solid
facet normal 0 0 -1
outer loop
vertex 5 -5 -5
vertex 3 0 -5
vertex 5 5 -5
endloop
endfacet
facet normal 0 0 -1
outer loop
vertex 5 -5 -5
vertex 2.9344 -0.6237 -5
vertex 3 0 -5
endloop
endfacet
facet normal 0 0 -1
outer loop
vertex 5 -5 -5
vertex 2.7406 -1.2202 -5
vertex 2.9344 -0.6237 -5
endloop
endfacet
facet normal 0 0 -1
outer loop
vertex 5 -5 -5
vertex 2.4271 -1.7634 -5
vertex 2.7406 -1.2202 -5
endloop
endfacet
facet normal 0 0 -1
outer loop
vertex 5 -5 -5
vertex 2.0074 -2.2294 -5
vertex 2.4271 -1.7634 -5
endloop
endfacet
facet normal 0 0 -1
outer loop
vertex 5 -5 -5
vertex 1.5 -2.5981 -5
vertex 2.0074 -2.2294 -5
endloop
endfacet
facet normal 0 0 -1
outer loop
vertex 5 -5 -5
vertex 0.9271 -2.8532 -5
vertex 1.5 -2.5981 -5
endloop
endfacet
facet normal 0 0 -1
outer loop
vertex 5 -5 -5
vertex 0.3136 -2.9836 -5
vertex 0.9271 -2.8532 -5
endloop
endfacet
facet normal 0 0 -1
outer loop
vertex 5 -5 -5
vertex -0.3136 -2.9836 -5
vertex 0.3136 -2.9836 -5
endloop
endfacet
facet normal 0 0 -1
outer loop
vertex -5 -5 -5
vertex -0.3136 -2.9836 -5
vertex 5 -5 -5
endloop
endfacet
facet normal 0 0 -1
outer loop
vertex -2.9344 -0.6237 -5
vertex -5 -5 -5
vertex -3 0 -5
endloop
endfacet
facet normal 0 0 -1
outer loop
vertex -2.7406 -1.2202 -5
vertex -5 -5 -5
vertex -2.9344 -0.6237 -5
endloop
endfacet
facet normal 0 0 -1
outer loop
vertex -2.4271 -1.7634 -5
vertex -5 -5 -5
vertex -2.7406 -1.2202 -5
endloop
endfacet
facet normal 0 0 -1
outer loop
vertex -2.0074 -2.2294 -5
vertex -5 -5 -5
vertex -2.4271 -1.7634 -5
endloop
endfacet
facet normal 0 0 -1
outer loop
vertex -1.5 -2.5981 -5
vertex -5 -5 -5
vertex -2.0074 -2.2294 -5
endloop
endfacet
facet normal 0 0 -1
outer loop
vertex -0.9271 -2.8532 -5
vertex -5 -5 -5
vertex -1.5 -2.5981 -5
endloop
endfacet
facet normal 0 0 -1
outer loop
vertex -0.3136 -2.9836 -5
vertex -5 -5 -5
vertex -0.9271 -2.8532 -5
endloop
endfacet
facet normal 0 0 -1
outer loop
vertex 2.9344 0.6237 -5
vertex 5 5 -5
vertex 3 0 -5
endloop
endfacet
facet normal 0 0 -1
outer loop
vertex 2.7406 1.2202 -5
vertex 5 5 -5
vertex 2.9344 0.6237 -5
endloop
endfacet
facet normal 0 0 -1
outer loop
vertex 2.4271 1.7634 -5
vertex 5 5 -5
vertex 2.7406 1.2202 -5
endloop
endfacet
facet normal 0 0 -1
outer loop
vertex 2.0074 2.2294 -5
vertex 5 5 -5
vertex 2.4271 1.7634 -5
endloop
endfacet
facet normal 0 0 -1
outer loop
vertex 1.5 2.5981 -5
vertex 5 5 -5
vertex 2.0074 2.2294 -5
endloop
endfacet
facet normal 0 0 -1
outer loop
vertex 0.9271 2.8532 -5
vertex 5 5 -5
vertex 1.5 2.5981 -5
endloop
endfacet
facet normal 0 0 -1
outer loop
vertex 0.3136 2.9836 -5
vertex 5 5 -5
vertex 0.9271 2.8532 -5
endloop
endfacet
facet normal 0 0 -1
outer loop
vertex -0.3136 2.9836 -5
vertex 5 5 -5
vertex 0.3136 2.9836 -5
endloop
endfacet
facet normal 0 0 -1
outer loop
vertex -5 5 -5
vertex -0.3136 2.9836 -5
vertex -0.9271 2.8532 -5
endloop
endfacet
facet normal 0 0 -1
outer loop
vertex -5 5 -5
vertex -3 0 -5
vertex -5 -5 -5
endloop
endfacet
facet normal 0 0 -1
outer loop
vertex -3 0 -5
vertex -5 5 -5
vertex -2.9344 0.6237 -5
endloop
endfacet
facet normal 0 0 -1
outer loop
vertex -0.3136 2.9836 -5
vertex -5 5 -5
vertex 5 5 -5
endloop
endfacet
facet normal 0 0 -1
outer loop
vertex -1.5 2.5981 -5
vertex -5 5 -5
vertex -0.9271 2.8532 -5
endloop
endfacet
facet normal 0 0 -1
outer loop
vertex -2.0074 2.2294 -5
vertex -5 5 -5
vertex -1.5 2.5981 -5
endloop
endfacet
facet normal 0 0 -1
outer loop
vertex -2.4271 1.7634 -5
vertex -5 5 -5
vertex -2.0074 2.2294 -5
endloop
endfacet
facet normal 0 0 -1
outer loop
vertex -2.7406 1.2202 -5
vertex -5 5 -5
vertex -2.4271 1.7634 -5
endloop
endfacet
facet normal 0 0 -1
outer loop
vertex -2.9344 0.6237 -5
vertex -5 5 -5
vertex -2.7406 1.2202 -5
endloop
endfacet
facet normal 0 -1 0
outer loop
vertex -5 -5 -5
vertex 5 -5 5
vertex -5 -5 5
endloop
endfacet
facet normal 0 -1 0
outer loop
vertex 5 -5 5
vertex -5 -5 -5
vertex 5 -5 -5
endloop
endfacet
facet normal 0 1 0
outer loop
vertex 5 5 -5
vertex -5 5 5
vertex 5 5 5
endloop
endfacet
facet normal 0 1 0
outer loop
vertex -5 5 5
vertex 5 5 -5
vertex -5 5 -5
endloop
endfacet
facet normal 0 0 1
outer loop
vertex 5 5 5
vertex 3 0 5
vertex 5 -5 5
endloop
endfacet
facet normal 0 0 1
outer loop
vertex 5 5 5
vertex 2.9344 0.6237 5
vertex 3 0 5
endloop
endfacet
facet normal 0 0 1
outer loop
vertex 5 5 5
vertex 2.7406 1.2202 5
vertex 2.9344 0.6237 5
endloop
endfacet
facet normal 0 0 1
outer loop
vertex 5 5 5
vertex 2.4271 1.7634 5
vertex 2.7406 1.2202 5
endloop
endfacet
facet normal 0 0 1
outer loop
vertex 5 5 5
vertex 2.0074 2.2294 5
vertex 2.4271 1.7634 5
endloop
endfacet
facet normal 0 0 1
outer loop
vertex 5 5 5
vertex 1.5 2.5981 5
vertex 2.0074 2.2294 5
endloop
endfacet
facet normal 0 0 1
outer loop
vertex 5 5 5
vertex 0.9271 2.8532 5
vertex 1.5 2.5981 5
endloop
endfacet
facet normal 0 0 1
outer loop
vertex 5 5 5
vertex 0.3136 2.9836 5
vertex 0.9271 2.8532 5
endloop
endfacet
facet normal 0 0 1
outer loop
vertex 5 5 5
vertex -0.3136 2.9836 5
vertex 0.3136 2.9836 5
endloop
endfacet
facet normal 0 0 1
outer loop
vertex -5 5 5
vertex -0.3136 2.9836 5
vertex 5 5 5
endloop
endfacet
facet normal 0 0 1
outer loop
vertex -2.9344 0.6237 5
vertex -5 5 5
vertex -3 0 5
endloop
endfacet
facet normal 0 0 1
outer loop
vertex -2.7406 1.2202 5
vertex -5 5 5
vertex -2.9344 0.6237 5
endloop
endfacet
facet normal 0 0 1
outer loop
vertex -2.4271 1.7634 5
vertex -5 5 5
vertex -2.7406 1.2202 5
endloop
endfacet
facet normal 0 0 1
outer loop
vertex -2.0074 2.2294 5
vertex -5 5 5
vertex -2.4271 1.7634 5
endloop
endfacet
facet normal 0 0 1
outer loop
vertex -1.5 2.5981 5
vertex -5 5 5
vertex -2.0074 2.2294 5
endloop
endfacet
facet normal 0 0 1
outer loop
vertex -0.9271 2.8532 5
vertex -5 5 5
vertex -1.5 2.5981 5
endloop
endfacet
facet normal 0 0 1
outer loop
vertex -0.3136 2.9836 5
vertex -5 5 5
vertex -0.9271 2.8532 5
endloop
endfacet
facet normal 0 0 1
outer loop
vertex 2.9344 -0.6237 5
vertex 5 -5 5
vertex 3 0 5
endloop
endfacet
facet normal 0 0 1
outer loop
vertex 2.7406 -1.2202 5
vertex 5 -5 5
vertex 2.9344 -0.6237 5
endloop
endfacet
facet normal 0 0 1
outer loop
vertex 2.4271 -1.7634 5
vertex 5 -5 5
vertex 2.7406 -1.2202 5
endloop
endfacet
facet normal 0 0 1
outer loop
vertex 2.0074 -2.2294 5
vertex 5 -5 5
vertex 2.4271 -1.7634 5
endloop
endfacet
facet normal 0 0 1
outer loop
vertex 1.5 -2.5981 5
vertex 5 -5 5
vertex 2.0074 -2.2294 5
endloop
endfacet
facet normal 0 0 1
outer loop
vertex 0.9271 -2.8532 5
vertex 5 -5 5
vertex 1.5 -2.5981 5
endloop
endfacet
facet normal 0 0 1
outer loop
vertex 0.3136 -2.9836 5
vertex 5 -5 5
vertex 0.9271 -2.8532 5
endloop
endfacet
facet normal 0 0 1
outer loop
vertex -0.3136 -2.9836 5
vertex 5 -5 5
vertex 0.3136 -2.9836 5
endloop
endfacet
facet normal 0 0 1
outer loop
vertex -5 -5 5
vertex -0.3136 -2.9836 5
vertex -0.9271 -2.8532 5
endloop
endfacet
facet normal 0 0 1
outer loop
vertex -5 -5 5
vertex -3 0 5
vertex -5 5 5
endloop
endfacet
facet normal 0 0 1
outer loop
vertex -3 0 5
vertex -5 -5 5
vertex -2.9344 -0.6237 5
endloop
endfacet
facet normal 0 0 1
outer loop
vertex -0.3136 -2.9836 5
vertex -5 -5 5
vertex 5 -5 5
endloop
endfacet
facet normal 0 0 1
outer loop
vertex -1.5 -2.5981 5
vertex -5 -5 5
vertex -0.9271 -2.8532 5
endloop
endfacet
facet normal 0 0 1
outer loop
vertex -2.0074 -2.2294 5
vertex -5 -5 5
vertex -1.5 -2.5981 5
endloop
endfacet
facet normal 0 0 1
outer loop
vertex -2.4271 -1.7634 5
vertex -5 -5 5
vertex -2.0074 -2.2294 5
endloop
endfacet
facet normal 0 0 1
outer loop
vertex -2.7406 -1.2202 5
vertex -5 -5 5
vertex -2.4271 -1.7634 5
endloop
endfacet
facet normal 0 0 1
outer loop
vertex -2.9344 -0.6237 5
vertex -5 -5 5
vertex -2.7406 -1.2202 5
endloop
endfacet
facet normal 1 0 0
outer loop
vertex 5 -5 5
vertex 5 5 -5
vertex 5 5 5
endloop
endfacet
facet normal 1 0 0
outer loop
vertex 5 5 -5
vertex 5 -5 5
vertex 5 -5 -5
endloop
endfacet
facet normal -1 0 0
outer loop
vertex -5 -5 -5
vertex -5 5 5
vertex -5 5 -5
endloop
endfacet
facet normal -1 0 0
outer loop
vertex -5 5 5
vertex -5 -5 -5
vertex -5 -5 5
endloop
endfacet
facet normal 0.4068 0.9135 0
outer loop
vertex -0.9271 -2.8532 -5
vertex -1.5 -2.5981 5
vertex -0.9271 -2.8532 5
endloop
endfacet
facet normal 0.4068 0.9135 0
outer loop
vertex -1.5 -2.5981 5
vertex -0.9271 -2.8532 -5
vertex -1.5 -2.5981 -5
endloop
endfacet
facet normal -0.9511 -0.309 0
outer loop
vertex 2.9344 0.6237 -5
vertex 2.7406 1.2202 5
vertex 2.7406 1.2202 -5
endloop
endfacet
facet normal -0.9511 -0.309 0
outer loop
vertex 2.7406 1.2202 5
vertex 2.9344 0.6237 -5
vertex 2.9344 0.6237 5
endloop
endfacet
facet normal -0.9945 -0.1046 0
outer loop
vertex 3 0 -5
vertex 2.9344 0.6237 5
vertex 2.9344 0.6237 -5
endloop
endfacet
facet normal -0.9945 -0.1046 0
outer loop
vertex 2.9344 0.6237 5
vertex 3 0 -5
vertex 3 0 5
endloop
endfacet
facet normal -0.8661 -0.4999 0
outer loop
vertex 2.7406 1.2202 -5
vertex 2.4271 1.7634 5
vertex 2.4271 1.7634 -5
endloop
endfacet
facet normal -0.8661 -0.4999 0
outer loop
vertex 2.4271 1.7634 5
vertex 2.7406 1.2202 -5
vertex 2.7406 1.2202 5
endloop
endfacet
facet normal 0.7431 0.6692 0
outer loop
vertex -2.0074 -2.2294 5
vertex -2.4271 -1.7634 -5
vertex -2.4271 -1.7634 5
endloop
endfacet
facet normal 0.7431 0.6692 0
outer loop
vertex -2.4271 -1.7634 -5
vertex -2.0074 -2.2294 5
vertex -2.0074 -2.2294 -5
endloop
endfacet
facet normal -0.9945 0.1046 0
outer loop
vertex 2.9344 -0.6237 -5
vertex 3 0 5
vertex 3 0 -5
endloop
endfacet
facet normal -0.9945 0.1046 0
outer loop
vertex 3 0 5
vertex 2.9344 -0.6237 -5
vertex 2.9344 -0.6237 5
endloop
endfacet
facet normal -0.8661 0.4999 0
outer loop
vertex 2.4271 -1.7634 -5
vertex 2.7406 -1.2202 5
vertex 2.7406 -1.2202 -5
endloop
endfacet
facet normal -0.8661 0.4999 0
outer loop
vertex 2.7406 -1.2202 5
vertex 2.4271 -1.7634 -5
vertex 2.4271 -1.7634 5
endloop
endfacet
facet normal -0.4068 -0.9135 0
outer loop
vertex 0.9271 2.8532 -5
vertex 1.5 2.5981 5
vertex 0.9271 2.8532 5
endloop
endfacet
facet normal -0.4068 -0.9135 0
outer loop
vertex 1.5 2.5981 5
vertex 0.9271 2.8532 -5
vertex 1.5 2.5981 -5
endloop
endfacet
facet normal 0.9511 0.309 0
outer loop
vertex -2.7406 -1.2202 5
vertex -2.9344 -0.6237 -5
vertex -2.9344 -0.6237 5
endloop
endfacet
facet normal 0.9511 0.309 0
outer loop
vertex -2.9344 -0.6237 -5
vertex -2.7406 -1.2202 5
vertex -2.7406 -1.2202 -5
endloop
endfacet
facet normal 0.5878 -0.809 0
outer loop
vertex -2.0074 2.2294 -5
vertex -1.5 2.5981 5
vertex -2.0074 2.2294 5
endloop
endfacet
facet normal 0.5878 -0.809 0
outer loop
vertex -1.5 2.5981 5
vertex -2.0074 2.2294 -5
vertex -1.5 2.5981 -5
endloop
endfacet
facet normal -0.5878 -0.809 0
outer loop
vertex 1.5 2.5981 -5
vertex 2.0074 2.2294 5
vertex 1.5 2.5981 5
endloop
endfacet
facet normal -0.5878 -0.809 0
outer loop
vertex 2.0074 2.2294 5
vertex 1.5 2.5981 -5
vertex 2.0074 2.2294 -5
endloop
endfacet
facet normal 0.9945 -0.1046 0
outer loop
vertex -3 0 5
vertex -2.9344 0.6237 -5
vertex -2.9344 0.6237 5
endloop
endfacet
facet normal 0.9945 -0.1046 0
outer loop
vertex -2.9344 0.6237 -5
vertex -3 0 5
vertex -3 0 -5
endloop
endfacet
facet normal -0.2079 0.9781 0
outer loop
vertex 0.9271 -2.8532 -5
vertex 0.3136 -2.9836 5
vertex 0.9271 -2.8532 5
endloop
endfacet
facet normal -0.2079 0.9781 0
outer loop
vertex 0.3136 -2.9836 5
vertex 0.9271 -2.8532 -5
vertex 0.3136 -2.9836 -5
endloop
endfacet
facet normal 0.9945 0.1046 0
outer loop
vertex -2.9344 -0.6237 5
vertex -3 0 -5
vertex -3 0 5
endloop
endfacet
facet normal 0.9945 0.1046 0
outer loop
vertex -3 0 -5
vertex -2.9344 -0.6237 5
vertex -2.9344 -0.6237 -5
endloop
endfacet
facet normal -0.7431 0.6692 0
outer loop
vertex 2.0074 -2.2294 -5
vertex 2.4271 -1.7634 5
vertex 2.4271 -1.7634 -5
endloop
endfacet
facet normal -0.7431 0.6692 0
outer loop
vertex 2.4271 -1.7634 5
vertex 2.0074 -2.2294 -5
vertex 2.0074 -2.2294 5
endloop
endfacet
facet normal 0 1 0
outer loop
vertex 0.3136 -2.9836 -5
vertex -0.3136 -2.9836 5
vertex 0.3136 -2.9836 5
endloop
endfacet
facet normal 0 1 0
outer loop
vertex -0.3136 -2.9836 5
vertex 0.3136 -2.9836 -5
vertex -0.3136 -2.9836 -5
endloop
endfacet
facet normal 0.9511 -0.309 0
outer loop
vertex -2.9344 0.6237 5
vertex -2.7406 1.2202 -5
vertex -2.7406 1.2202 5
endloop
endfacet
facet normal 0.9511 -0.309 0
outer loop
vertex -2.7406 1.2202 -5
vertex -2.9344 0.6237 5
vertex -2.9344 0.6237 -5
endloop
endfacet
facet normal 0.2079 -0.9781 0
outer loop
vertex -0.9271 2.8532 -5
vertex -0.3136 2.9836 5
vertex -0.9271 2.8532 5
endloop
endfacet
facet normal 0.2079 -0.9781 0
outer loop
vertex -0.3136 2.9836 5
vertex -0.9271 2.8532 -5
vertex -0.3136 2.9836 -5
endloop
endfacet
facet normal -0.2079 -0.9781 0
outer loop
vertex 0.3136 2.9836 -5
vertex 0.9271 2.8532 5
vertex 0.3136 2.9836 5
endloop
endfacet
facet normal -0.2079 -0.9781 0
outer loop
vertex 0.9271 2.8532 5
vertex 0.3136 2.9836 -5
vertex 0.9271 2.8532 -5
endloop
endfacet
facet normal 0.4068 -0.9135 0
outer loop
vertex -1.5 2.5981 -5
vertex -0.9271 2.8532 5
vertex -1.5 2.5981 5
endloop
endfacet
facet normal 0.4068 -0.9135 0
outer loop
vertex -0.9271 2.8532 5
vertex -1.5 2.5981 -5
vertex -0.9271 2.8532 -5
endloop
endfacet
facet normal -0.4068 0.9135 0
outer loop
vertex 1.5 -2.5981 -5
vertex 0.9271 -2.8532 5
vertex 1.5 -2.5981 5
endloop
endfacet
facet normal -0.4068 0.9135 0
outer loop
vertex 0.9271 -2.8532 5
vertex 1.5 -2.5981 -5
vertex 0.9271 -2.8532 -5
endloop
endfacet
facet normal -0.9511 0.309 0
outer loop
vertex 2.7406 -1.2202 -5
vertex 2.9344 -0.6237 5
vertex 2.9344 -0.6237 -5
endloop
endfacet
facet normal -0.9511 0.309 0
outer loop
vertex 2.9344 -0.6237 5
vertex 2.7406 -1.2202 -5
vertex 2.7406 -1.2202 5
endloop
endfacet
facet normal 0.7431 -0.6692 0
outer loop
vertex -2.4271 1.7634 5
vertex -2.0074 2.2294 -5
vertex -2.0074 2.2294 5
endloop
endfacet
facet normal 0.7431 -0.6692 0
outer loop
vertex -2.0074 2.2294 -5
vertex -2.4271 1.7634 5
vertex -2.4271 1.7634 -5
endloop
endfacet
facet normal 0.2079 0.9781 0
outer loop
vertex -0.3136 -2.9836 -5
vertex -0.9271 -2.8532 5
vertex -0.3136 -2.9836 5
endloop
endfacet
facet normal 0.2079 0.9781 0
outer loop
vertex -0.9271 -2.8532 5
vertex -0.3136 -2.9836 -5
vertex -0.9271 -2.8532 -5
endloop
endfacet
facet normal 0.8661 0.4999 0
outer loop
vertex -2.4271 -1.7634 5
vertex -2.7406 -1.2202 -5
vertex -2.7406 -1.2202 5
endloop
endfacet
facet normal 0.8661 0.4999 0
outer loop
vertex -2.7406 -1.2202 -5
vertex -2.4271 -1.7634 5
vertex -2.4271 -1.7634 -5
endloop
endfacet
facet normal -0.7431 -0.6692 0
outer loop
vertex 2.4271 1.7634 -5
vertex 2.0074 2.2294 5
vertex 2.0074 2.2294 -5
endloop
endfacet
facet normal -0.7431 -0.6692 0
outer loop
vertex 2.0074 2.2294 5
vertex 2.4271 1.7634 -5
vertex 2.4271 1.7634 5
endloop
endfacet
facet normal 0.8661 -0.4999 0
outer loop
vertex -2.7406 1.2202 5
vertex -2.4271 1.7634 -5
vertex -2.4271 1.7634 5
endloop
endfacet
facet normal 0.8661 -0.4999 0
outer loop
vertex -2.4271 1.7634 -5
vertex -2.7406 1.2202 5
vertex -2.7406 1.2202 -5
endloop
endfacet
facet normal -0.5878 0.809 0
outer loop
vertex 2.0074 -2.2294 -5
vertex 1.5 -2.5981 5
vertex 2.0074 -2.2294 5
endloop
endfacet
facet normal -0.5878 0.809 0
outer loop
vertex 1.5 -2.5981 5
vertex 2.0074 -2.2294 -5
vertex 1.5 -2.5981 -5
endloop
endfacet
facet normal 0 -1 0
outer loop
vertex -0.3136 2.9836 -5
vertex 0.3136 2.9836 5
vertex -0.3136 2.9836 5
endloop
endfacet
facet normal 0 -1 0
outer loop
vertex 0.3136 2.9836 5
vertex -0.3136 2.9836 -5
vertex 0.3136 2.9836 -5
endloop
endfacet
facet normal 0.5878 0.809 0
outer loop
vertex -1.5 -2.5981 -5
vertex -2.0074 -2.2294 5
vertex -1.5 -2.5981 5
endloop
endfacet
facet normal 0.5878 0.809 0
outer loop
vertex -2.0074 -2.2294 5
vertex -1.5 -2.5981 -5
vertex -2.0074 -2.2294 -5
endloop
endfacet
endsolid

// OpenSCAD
//Created by Kimberly A Schumann
//Remixed from Customizable dice with custom engraved images, created by: Ari M Diacou
//http://www.thingiverse.com/thing:131071
//Shared under Creative Commons License: Attribution-ShareAlike 3.0 Unported (CC BY-SA 3.0) 
//see http://creativecommons.org/licenses/by-sa/3.0/

/*To get this to work offline, any image must be converted to a .dat file using the tool at http://customizer.makerbot.com/image_surface. That will output an array of values from 0-1 corresponding to the greyscale values 0-255 of the image. Inverting the colors of the image will ensure that the recessed image gets subracted from other objects properly. Copy the arry to a text file. IMPORTANT: be sure that your file is actually a dat file and not e.g. foo.dat.txt. Some operating systems (like Windows 7 by default) hide the actual extension. Once the dat files are in the same directory as the .scad file, and are named properly the surface() function should work.

The way I prepared my image files was to:
	1	Import the image into gimp.
	2	Crop the image as tightly as possible
	3	Right click on the image: Image>Scale Image
	4	With the aspect ratio locked, change the Higher of the width and height to 100 pixels.
	5	Right click on the image: Image>Canvas Size
	6	With the aspect ratio UNlocked, change the Lower of the width and height to 100 pixels. Click "Center". Click "Resize".
	7	Right click on the image: Colors>Brightness-Contrast
	8	Increase the contrast to remove the effects of the resize, and get sharper edges.
	9	Export the file to jpg/gif/bmp/png (it doesnt really matter as long as the customizer tool can read the file).
	10	Open  http://customizer.makerbot.com/image_surface in a web browser.
	11	Select the file you want to convert. Click "Invert Colors".
	12	Copy the array of numbers to a text file. 
	13	File>Save As. In the drop-down menu "Save as type:" select "All files". This will allow you to actually set the extenstion to ".dat". Name the file <whatever>.dat.
	
Your image should now create a surface() as intended. */

////////////////////Parameters////////////////////
/* [Images] */
// Load a 40x40 pixel image for side 1. (images will be automatically stretched to fit) Simple, high contrast images like logos work best.
i1 = "toadstool.dat"; // [image_surface:40x40]
// Load a 40x40 pixel image for side 2. (images will be automatically stretched to fit) Simple, high contrast images like logos work best.
i2= "bshield.dat"; // [image_surface:40x40]
// Load a 40x40 pixel image for side 3. (images will be automatically stretched to fit) Simple, high contrast images like logos work best.
i3= "toadstool.dat"; // [image_surface:40x40]
// Load a 40x40 pixel image for side 4. (images will be automatically stretched to fit) Simple, high contrast images like logos work best.
i4= "toadstool.dat"; // [image_surface:40x40]

/* [Dimensions] */
//Depth of indendations in mm
depth=1;
//One side of the cube in mm
cube_size=10;
//How big should your image be in mm?
image_size=8;
//Diameter of charm hole (Pandora charm bracelets have a diameter of 3mm)
charm_hole=6;

/* [Hidden] */
pixels=40+0;
image=[i1,i2,i3,i4];
//How each die surface is rotated
rot=[[90,90,0],[0,90,0],[270,90,0],[180,90,0]];
ep=0+0.01;

////////////////////Main()////////////////////
difference(){
	intersection_for(i=[1:4]) {side(i);}
	//Each side is a cube minus the image, the die is the intersection of all the cubes
	cylinder(h=cube_size+ep,r=charm_hole/2,$fn=30,center=true);
	}

////////////////////Modules////////////////////
module side(side_num){
//this function takes the surface, scales it to the right size then subtracts the surface from the cube. The resulting cube is then rotated into the correct position.
	rotate(rot[side_num-1])	
		difference(){
			cube(cube_size,true);
			translate([0,0,cube_size/2]) 
				scale([image_size/pixels,image_size/pixels,-depth]) 
					surface(file=image[side_num-1], center=true, convexity=10);
			}
	}
